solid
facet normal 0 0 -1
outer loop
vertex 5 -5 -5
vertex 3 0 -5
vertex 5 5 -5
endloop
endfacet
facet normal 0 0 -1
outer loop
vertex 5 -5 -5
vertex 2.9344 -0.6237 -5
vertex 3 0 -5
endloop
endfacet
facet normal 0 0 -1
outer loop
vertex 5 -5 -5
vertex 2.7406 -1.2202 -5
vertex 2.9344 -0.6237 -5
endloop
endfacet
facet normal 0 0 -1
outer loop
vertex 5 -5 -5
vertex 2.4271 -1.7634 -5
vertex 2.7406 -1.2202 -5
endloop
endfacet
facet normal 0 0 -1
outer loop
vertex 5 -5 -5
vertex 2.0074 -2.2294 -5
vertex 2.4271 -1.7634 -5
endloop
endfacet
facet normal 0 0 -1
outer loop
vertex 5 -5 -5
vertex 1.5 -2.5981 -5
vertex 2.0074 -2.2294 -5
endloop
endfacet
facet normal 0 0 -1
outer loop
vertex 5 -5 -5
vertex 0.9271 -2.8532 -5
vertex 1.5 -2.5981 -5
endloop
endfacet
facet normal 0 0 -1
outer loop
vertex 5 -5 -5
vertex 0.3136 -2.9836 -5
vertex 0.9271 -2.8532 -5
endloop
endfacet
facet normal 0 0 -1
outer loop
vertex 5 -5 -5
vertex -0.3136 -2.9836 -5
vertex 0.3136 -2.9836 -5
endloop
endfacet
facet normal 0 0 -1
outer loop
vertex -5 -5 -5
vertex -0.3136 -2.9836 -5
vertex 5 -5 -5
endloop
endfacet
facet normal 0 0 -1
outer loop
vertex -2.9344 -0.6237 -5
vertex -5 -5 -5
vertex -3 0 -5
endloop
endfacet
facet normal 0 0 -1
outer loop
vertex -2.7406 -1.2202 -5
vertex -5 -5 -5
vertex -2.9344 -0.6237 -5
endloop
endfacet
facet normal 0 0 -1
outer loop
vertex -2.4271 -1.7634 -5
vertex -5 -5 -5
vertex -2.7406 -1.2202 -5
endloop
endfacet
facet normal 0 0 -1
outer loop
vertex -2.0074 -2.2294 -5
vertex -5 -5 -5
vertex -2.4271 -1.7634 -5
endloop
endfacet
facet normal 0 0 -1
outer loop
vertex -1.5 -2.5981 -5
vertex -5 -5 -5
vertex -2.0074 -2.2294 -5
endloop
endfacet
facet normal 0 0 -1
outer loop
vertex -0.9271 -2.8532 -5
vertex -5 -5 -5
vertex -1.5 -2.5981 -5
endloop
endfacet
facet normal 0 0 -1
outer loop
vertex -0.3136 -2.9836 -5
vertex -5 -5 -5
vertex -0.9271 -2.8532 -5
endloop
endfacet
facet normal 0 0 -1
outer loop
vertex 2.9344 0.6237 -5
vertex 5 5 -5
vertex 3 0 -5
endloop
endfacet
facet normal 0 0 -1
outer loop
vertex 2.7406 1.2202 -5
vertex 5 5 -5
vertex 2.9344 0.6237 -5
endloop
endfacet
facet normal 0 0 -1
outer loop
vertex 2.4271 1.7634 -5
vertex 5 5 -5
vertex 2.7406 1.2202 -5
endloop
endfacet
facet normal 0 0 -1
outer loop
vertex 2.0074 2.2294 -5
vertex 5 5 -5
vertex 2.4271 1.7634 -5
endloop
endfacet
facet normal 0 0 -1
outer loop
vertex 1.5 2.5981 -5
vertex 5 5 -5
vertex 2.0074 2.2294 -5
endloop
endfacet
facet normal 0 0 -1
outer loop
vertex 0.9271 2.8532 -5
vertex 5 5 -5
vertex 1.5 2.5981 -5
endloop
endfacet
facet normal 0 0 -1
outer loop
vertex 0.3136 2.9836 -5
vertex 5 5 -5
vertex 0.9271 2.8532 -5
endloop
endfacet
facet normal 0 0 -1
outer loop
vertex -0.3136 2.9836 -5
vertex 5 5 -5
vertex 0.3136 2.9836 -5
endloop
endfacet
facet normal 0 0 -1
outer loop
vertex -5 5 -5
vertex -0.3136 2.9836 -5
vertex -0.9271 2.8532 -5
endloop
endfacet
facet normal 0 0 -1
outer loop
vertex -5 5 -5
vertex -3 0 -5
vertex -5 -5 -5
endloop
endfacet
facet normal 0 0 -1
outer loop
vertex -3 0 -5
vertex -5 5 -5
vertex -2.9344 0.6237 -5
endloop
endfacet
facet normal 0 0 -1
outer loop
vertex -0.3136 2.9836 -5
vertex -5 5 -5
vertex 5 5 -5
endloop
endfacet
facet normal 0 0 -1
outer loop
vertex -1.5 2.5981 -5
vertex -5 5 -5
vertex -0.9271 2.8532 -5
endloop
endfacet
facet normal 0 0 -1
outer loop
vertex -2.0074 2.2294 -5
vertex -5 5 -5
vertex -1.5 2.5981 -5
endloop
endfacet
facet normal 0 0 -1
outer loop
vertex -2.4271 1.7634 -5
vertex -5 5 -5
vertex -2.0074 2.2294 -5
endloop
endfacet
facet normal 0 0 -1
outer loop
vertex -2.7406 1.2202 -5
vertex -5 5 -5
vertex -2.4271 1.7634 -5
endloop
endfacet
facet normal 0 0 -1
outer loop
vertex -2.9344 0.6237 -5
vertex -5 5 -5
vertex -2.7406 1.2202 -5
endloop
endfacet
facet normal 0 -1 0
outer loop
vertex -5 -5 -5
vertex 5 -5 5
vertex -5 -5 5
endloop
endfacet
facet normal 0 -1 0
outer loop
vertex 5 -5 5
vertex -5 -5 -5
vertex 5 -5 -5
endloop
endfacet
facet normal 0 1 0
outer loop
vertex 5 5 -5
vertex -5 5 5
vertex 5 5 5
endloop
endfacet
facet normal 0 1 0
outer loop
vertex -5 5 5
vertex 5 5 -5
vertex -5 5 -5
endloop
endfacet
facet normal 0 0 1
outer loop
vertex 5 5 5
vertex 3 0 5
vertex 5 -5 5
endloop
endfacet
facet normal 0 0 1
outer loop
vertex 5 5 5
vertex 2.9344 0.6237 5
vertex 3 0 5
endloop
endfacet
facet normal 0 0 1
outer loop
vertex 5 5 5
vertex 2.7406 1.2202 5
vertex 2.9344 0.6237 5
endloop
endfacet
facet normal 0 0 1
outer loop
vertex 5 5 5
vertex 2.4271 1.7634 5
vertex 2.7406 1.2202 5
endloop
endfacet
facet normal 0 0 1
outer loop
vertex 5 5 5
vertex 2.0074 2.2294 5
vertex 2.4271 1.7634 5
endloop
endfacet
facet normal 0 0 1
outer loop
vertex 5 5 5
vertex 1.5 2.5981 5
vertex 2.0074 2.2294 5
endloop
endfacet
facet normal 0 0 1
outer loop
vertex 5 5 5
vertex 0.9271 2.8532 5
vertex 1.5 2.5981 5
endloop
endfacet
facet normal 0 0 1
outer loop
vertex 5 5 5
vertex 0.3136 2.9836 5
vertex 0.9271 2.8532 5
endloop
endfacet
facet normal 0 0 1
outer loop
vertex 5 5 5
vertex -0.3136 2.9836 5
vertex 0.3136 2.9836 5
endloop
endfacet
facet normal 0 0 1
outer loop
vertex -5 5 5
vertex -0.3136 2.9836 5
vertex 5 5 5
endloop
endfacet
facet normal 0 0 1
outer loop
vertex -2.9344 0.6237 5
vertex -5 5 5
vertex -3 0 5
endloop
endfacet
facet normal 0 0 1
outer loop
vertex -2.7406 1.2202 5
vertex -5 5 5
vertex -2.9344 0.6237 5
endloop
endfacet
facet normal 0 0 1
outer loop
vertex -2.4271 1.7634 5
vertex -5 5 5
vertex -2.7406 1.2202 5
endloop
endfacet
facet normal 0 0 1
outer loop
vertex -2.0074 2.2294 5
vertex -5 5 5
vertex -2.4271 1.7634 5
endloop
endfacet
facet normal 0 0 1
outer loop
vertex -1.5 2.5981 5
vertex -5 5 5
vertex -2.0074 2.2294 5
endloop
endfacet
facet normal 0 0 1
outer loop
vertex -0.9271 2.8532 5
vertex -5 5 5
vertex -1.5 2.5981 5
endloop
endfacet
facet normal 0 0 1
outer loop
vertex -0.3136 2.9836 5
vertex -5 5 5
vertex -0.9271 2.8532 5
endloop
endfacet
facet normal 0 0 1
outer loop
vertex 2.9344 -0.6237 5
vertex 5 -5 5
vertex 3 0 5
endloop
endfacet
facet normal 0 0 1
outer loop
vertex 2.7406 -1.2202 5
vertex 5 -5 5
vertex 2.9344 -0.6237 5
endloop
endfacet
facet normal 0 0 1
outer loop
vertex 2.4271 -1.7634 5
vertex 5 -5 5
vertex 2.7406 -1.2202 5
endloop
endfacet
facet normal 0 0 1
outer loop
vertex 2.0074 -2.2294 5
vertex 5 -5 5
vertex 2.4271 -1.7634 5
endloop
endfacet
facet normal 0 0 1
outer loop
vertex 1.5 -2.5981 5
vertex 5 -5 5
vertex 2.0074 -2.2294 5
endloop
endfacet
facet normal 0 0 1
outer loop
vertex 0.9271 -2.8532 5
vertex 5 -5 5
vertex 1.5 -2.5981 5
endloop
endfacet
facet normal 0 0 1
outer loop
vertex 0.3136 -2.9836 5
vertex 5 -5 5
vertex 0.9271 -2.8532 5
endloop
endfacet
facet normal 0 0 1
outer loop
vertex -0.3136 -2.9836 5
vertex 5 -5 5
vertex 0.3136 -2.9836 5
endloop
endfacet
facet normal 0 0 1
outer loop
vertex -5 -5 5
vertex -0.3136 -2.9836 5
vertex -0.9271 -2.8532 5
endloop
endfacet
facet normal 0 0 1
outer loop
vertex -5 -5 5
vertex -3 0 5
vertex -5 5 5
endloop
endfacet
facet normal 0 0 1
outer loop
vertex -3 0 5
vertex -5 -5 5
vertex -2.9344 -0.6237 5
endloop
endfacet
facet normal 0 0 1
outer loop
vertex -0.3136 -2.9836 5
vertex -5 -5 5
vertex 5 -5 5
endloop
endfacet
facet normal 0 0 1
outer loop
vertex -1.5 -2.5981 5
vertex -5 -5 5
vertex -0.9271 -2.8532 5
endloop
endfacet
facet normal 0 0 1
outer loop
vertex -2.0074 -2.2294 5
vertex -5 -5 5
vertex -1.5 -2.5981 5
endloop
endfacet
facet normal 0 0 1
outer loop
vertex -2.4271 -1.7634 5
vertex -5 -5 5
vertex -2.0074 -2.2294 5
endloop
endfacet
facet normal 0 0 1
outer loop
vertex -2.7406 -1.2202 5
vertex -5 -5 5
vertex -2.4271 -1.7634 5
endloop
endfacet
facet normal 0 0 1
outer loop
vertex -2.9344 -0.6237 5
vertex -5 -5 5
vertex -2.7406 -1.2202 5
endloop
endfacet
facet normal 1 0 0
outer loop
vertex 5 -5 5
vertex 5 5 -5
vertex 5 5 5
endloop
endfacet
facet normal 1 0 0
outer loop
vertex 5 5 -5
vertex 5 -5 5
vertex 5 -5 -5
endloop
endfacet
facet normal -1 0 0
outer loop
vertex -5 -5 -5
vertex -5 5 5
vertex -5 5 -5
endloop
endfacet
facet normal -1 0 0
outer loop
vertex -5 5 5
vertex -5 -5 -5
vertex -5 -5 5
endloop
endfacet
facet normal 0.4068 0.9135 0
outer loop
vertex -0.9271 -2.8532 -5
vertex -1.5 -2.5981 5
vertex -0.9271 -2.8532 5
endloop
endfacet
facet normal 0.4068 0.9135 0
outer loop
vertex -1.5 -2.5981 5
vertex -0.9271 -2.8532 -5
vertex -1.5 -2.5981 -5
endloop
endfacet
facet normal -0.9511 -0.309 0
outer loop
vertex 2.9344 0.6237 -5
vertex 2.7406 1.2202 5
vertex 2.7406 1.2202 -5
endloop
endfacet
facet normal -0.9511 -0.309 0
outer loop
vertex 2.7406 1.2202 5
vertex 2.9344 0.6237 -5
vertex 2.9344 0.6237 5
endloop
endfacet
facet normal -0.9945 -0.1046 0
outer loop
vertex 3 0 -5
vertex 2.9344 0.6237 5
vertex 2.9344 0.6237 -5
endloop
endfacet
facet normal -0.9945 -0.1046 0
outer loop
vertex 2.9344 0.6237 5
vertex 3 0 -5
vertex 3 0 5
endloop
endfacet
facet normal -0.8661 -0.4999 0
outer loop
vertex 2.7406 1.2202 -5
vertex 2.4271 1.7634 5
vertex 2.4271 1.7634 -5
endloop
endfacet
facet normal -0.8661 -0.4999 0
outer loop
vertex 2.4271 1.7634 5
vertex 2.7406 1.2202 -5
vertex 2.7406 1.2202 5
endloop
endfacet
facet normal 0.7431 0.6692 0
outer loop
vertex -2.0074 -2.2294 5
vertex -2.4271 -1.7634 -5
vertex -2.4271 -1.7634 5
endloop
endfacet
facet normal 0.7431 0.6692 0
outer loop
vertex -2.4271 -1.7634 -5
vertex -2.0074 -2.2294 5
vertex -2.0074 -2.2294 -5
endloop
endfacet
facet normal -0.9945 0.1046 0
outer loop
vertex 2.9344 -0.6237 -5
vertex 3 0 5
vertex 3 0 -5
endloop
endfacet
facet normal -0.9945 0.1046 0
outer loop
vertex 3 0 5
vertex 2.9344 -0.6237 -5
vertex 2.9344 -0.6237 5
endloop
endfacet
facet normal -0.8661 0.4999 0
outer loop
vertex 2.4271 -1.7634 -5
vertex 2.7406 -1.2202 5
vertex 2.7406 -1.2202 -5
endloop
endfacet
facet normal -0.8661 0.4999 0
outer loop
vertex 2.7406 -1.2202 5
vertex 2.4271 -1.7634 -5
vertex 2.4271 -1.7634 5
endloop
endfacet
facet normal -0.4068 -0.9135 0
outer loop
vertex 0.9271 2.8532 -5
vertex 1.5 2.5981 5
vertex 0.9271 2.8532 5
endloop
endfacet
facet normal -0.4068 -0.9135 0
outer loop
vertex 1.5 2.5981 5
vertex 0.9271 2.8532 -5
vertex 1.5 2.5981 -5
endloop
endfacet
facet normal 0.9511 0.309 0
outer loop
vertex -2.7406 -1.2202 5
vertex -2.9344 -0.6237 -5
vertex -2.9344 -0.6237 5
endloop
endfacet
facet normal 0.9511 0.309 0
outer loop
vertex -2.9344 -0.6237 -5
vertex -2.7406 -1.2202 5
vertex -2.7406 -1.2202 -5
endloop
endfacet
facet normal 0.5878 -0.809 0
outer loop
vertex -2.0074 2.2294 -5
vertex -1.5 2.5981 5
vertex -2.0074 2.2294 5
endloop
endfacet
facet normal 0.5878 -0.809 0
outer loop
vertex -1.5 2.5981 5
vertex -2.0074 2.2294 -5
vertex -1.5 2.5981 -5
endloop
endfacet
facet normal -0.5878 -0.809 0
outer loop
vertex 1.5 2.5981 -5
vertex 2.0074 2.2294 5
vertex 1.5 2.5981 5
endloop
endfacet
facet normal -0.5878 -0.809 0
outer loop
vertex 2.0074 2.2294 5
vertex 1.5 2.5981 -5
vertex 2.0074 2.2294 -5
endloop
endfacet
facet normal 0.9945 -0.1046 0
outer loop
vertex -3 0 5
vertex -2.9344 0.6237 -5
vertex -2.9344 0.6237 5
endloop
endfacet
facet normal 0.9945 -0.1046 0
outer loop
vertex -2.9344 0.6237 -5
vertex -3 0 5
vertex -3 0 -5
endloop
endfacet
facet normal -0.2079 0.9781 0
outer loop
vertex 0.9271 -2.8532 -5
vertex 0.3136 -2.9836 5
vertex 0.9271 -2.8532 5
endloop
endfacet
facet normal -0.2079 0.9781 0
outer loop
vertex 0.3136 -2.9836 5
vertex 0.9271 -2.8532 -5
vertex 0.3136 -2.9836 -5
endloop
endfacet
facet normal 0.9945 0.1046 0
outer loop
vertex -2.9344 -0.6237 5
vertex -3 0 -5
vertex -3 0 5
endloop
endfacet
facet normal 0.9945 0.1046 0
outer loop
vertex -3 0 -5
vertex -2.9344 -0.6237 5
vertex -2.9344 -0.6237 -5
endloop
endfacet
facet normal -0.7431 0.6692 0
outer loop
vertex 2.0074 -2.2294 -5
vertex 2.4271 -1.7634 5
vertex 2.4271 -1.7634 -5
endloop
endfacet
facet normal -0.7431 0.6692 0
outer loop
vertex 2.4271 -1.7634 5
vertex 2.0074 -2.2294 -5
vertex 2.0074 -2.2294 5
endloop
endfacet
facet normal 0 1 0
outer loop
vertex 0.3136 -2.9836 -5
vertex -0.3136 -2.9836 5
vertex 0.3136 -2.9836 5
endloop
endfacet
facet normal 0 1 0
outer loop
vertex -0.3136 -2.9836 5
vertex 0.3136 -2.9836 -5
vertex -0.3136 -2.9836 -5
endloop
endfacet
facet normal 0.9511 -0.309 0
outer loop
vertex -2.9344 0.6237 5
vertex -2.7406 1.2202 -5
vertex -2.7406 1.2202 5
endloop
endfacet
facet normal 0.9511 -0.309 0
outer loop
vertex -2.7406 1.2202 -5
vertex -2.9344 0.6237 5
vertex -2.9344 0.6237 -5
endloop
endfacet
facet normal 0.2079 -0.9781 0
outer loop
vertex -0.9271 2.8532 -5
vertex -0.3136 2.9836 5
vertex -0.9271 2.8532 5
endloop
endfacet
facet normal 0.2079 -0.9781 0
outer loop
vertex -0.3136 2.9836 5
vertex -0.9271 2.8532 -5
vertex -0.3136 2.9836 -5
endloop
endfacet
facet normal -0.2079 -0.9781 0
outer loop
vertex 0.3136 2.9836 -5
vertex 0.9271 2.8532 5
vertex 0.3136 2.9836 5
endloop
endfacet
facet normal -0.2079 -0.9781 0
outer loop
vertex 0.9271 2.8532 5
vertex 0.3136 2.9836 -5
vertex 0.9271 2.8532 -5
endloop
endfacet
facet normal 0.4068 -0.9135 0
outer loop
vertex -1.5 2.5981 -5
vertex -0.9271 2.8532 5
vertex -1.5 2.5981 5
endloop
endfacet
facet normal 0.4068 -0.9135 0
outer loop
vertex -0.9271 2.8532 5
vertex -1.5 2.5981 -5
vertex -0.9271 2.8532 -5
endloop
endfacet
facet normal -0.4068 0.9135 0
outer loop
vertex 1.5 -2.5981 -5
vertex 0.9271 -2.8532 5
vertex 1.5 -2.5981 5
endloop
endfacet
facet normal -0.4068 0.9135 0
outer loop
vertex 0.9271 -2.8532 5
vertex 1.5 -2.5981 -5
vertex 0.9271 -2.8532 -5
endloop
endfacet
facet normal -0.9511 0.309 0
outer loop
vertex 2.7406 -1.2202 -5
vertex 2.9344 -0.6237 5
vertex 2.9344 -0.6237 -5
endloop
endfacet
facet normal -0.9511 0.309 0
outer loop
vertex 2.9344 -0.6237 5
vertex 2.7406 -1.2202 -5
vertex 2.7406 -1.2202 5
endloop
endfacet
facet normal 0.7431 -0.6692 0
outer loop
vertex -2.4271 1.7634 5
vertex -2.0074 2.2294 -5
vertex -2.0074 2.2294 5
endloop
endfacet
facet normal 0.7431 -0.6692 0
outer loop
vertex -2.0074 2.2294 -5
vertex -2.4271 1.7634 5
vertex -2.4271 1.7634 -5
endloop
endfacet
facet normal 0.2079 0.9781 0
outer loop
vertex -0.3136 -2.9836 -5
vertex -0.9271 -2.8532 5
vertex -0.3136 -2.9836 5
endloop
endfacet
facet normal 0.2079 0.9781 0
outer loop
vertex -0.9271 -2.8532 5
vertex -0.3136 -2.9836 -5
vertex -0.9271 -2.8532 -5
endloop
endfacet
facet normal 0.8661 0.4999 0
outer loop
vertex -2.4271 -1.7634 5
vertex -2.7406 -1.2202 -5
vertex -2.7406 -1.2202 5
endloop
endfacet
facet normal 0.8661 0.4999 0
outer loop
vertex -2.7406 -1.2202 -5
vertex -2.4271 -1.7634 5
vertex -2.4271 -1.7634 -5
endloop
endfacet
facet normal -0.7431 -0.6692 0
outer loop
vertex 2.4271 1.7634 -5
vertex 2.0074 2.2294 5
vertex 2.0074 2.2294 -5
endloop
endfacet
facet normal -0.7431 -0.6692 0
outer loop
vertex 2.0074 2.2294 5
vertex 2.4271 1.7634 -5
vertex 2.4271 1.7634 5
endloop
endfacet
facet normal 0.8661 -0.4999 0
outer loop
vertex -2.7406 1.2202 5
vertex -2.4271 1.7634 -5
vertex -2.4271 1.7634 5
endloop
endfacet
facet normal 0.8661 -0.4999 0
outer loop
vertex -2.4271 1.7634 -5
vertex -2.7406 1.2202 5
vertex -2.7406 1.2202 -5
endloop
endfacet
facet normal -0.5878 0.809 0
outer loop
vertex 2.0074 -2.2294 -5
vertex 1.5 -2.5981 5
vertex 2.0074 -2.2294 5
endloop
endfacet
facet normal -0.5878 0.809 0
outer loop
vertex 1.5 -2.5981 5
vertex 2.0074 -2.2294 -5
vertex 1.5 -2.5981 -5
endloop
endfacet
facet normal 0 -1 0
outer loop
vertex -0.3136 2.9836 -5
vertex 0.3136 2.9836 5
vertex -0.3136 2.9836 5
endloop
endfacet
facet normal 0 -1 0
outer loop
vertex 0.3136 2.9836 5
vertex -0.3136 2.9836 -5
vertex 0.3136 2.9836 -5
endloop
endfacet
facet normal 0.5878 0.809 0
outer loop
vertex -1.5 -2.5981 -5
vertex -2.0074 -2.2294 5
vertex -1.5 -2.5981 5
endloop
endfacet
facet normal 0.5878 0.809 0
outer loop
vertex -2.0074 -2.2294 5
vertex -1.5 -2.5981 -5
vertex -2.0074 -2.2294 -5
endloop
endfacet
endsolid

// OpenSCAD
//Created by Kimberly A Schumann
//Remixed from Customizable dice with custom engraved images, created by: Ari M Diacou
//http://www.thingiverse.com/thing:131071
//Shared under Creative Commons License: Attribution-ShareAlike 3.0 Unported (CC BY-SA 3.0) 
//see http://creativecommons.org/licenses/by-sa/3.0/

/*To get this to work offline, any image must be converted to a .dat file using the tool at http://customizer.makerbot.com/image_surface. That will output an array of values from 0-1 corresponding to the greyscale values 0-255 of the image. Inverting the colors of the image will ensure that the recessed image gets subracted from other objects properly. Copy the arry to a text file. IMPORTANT: be sure that your file is actually a dat file and not e.g. foo.dat.txt. Some operating systems (like Windows 7 by default) hide the actual extension. Once the dat files are in the same directory as the .scad file, and are named properly the surface() function should work.

The way I prepared my image files was to:
	1	Import the image into gimp.
	2	Crop the image as tightly as possible
	3	Right click on the image: Image>Scale Image
	4	With the aspect ratio locked, change the Higher of the width and height to 100 pixels.
	5	Right click on the image: Image>Canvas Size
	6	With the aspect ratio UNlocked, change the Lower of the width and height to 100 pixels. Click "Center". Click "Resize".
	7	Right click on the image: Colors>Brightness-Contrast
	8	Increase the contrast to remove the effects of the resize, and get sharper edges.
	9	Export the file to jpg/gif/bmp/png (it doesnt really matter as long as the customizer tool can read the file).
	10	Open  http://customizer.makerbot.com/image_surface in a web browser.
	11	Select the file you want to convert. Click "Invert Colors".
	12	Copy the array of numbers to a text file. 
	13	File>Save As. In the drop-down menu "Save as type:" select "All files". This will allow you to actually set the extenstion to ".dat". Name the file <whatever>.dat.
	
Your image should now create a surface() as intended. */

////////////////////Parameters////////////////////
/* [Images] */
// Load a 40x40 pixel image for side 1. (images will be automatically stretched to fit) Simple, high contrast images like logos work best.
i1 = "toadstool.dat"; // [image_surface:40x40]
// Load a 40x40 pixel image for side 2. (images will be automatically stretched to fit) Simple, high contrast images like logos work best.
i2= "bshield.dat"; // [image_surface:40x40]
// Load a 40x40 pixel image for side 3. (images will be automatically stretched to fit) Simple, high contrast images like logos work best.
i3= "toadstool.dat"; // [image_surface:40x40]
// Load a 40x40 pixel image for side 4. (images will be automatically stretched to fit) Simple, high contrast images like logos work best.
i4= "toadstool.dat"; // [image_surface:40x40]

/* [Dimensions] */
//Depth of indendations in mm
depth=1;
//One side of the cube in mm
cube_size=10;
//How big should your image be in mm?
image_size=8;
//Diameter of charm hole (Pandora charm bracelets have a diameter of 3mm)
charm_hole=6;

/* [Hidden] */
pixels=40+0;
image=[i1,i2,i3,i4];
//How each die surface is rotated
rot=[[90,90,0],[0,90,0],[270,90,0],[180,90,0]];
ep=0+0.01;

////////////////////Main()////////////////////
difference(){
	intersection_for(i=[1:4]) {side(i);}
	//Each side is a cube minus the image, the die is the intersection of all the cubes
	cylinder(h=cube_size+ep,r=charm_hole/2,$fn=30,center=true);
	}

////////////////////Modules////////////////////
module side(side_num){
//this function takes the surface, scales it to the right size then subtracts the surface from the cube. The resulting cube is then rotated into the correct position.
	rotate(rot[side_num-1])	
		difference(){
			cube(cube_size,true);
			translate([0,0,cube_size/2]) 
				scale([image_size/pixels,image_size/pixels,-depth]) 
					surface(file=image[side_num-1], center=true, convexity=10);
			}
	}
